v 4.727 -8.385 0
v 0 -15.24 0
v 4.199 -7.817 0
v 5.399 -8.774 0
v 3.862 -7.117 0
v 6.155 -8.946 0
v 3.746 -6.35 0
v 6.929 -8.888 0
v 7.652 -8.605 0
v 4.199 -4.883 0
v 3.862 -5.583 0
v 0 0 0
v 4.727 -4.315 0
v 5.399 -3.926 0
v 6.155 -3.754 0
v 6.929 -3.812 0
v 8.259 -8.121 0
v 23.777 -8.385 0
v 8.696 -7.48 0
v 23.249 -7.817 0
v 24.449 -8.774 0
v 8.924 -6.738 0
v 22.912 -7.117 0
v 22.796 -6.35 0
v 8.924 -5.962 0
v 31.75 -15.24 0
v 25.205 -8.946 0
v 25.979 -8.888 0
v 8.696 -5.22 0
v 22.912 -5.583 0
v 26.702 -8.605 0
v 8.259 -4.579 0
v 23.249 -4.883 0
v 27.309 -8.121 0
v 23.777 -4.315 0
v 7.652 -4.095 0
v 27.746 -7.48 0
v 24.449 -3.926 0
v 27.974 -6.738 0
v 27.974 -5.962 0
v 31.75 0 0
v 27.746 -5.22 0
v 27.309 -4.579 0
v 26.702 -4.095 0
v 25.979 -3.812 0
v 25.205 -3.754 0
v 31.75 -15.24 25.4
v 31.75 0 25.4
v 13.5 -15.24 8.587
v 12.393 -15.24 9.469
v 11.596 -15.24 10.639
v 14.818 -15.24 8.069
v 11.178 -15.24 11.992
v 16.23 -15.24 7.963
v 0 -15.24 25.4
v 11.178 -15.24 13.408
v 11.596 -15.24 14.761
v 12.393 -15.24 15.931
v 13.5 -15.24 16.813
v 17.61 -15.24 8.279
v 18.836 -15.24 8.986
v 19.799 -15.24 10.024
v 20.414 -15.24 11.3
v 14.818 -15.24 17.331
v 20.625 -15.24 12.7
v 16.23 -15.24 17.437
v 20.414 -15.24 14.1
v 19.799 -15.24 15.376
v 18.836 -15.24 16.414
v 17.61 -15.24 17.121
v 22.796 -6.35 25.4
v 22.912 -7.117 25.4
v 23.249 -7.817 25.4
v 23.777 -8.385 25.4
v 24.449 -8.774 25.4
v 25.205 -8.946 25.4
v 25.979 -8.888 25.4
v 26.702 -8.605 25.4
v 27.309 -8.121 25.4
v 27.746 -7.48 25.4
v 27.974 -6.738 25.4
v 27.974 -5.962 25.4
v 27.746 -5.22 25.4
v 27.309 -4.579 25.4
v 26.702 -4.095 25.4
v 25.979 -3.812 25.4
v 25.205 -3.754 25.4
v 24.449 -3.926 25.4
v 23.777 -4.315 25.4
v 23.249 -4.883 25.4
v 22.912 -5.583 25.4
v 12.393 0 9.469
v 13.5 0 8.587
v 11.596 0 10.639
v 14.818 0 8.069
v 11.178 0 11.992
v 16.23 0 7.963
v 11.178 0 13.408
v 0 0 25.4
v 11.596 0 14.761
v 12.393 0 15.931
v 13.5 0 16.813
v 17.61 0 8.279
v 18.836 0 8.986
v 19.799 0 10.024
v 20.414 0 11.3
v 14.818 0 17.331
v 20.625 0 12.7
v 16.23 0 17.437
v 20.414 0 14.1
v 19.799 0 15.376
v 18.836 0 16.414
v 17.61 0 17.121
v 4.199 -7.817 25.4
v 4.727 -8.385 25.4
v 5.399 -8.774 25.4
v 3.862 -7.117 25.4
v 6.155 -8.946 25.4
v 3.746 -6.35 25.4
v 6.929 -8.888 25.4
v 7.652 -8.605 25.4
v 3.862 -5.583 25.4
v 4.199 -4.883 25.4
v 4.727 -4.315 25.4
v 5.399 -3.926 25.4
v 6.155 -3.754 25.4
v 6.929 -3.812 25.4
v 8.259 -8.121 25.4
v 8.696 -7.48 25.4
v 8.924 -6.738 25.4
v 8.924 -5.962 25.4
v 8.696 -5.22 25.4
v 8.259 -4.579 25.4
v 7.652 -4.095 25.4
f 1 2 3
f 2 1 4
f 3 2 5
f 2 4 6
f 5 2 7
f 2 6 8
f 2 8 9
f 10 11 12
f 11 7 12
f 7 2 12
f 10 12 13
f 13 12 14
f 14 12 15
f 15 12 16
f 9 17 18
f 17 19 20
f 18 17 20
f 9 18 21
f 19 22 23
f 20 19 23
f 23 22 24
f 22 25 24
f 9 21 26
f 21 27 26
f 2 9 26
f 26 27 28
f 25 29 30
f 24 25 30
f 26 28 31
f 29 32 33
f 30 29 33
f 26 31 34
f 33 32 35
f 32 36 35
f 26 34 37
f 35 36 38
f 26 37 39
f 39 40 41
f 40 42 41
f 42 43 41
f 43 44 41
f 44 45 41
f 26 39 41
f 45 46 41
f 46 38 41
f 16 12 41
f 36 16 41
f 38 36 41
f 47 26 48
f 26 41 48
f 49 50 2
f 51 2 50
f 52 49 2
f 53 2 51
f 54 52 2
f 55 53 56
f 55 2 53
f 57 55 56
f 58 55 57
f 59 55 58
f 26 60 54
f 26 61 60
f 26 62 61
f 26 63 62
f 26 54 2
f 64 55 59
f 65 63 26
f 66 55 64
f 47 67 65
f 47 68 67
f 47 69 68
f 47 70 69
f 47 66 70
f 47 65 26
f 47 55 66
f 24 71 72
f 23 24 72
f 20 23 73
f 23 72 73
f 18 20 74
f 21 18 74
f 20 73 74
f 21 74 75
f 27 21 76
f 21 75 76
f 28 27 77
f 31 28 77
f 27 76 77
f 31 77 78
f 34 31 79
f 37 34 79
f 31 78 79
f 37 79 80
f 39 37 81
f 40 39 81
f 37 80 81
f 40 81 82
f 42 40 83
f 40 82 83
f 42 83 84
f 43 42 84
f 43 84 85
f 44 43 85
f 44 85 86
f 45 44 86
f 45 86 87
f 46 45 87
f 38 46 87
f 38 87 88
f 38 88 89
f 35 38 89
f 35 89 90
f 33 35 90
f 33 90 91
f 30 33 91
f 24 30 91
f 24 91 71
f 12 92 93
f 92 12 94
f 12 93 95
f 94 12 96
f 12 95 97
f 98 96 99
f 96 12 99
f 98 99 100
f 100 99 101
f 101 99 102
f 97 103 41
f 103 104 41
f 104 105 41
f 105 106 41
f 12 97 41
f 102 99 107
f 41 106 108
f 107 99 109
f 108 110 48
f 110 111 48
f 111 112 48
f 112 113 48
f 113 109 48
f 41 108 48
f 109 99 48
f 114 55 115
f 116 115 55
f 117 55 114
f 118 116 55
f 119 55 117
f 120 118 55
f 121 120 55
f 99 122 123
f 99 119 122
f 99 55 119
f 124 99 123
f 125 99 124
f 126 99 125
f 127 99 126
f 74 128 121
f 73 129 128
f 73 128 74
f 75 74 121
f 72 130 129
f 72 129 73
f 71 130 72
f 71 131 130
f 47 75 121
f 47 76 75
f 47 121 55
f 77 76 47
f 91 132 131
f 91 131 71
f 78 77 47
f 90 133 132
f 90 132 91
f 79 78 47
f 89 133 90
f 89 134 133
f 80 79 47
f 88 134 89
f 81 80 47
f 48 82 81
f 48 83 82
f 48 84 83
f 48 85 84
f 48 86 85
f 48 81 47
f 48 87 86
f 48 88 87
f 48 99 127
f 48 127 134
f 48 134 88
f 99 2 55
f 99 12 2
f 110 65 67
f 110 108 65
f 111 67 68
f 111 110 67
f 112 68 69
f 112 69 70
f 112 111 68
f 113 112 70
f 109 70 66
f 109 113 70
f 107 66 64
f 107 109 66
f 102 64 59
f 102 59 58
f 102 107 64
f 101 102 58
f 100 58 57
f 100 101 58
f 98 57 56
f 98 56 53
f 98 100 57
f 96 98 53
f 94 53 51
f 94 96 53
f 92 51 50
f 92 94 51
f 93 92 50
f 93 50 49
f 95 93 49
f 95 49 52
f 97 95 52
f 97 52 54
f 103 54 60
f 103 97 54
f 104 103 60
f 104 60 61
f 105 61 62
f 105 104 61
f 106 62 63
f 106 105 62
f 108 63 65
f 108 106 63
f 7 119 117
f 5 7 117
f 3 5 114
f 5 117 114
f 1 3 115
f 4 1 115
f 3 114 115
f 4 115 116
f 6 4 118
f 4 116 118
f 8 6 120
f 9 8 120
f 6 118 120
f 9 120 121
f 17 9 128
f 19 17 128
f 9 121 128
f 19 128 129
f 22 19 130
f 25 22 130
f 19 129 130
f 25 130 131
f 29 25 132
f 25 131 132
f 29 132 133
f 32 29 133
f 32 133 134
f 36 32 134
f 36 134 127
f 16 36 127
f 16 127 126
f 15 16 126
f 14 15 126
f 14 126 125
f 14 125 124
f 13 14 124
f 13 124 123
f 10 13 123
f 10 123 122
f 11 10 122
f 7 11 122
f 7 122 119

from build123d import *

# Parameters (mm, degrees)
F0_W     = 31.75
F0_H     = 25.4
F1_DEPTH = 12.7
F2_R     = 4.7498
F3_DEPTH = 12.7
F4_R     = 9.525
F4_R_2   = 4.7498
F4_R_3   = 3.96875
F5_DEPTH = 3.175
F7_D     = 5.207
F4_W     = 31.75
F4_H     = 25.4
F9_DEPTH = 2.54


with BuildPart() as f1:
    # F0 (on Front) → F1 (new body)
    with BuildSketch(Plane.XZ):
        with Locations((15.875, 12.7)):
            Rectangle(F0_W, F0_H)
    extrude(amount=F1_DEPTH)

    # F2 (on face) → F3 (cut, through all)
    with BuildSketch(Plane.XZ.offset(12.7)):
        with Locations((15.875, 12.7)):
            Circle(F2_R)
    extrude(amount=-F3_DEPTH, mode=Mode.SUBTRACT)

    # F7 (through all)
    with Locations(Plane(origin=(0, 0, 0), x_dir=(1, 0, 0), z_dir=(0, 0, -1))):
        with Locations((6.35, 6.35), (25.4, 6.35)):
            Hole(F7_D / 2)

    # F4 (on face) → F9 (join)
    with BuildSketch(Plane.XZ.offset(12.7)):
        with Locations((15.875, 12.7)):
            Rectangle(F4_W, F4_H)
        with Locations((15.875, 12.7)):
            Circle(F4_R, mode=Mode.SUBTRACT)
        with Locations((15.875, 12.7)):
            Circle(F4_R)
        with Locations((15.875, 12.7)):
            Circle(F4_R_2, mode=Mode.SUBTRACT)
    extrude(amount=F9_DEPTH)


with BuildPart() as f5:
    # F4 (on face) → F5 (new body)
    with BuildSketch(Plane.XZ.offset(12.7)):
        with Locations((15.875, 12.7)):
            Circle(F4_R)
        with Locations((15.875, 12.7)):
            Circle(F4_R_2, mode=Mode.SUBTRACT)
        with Locations((15.875, 12.7)):
            Circle(F4_R_2)
        with Locations((15.875, 12.7)):
            Circle(F4_R_3, mode=Mode.SUBTRACT)
    extrude(amount=F5_DEPTH)


solid = f1.part
